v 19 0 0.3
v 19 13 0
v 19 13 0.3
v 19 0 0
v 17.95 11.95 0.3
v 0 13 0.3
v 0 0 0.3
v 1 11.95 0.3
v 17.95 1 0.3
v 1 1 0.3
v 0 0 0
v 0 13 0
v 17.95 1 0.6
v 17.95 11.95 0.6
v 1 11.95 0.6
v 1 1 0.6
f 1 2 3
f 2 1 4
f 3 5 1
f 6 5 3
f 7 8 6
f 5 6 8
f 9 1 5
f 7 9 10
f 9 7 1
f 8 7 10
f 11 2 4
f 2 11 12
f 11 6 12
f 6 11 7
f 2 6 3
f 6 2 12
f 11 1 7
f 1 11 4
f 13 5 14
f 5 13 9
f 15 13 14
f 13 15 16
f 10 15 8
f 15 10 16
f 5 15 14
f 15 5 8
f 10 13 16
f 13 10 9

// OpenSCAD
difference() {
    cube([19,13,0.3]);
    
    
}
translate([1,1,0.2]) {
        cube([16.95,10.95, 0.4]);
    }
    
